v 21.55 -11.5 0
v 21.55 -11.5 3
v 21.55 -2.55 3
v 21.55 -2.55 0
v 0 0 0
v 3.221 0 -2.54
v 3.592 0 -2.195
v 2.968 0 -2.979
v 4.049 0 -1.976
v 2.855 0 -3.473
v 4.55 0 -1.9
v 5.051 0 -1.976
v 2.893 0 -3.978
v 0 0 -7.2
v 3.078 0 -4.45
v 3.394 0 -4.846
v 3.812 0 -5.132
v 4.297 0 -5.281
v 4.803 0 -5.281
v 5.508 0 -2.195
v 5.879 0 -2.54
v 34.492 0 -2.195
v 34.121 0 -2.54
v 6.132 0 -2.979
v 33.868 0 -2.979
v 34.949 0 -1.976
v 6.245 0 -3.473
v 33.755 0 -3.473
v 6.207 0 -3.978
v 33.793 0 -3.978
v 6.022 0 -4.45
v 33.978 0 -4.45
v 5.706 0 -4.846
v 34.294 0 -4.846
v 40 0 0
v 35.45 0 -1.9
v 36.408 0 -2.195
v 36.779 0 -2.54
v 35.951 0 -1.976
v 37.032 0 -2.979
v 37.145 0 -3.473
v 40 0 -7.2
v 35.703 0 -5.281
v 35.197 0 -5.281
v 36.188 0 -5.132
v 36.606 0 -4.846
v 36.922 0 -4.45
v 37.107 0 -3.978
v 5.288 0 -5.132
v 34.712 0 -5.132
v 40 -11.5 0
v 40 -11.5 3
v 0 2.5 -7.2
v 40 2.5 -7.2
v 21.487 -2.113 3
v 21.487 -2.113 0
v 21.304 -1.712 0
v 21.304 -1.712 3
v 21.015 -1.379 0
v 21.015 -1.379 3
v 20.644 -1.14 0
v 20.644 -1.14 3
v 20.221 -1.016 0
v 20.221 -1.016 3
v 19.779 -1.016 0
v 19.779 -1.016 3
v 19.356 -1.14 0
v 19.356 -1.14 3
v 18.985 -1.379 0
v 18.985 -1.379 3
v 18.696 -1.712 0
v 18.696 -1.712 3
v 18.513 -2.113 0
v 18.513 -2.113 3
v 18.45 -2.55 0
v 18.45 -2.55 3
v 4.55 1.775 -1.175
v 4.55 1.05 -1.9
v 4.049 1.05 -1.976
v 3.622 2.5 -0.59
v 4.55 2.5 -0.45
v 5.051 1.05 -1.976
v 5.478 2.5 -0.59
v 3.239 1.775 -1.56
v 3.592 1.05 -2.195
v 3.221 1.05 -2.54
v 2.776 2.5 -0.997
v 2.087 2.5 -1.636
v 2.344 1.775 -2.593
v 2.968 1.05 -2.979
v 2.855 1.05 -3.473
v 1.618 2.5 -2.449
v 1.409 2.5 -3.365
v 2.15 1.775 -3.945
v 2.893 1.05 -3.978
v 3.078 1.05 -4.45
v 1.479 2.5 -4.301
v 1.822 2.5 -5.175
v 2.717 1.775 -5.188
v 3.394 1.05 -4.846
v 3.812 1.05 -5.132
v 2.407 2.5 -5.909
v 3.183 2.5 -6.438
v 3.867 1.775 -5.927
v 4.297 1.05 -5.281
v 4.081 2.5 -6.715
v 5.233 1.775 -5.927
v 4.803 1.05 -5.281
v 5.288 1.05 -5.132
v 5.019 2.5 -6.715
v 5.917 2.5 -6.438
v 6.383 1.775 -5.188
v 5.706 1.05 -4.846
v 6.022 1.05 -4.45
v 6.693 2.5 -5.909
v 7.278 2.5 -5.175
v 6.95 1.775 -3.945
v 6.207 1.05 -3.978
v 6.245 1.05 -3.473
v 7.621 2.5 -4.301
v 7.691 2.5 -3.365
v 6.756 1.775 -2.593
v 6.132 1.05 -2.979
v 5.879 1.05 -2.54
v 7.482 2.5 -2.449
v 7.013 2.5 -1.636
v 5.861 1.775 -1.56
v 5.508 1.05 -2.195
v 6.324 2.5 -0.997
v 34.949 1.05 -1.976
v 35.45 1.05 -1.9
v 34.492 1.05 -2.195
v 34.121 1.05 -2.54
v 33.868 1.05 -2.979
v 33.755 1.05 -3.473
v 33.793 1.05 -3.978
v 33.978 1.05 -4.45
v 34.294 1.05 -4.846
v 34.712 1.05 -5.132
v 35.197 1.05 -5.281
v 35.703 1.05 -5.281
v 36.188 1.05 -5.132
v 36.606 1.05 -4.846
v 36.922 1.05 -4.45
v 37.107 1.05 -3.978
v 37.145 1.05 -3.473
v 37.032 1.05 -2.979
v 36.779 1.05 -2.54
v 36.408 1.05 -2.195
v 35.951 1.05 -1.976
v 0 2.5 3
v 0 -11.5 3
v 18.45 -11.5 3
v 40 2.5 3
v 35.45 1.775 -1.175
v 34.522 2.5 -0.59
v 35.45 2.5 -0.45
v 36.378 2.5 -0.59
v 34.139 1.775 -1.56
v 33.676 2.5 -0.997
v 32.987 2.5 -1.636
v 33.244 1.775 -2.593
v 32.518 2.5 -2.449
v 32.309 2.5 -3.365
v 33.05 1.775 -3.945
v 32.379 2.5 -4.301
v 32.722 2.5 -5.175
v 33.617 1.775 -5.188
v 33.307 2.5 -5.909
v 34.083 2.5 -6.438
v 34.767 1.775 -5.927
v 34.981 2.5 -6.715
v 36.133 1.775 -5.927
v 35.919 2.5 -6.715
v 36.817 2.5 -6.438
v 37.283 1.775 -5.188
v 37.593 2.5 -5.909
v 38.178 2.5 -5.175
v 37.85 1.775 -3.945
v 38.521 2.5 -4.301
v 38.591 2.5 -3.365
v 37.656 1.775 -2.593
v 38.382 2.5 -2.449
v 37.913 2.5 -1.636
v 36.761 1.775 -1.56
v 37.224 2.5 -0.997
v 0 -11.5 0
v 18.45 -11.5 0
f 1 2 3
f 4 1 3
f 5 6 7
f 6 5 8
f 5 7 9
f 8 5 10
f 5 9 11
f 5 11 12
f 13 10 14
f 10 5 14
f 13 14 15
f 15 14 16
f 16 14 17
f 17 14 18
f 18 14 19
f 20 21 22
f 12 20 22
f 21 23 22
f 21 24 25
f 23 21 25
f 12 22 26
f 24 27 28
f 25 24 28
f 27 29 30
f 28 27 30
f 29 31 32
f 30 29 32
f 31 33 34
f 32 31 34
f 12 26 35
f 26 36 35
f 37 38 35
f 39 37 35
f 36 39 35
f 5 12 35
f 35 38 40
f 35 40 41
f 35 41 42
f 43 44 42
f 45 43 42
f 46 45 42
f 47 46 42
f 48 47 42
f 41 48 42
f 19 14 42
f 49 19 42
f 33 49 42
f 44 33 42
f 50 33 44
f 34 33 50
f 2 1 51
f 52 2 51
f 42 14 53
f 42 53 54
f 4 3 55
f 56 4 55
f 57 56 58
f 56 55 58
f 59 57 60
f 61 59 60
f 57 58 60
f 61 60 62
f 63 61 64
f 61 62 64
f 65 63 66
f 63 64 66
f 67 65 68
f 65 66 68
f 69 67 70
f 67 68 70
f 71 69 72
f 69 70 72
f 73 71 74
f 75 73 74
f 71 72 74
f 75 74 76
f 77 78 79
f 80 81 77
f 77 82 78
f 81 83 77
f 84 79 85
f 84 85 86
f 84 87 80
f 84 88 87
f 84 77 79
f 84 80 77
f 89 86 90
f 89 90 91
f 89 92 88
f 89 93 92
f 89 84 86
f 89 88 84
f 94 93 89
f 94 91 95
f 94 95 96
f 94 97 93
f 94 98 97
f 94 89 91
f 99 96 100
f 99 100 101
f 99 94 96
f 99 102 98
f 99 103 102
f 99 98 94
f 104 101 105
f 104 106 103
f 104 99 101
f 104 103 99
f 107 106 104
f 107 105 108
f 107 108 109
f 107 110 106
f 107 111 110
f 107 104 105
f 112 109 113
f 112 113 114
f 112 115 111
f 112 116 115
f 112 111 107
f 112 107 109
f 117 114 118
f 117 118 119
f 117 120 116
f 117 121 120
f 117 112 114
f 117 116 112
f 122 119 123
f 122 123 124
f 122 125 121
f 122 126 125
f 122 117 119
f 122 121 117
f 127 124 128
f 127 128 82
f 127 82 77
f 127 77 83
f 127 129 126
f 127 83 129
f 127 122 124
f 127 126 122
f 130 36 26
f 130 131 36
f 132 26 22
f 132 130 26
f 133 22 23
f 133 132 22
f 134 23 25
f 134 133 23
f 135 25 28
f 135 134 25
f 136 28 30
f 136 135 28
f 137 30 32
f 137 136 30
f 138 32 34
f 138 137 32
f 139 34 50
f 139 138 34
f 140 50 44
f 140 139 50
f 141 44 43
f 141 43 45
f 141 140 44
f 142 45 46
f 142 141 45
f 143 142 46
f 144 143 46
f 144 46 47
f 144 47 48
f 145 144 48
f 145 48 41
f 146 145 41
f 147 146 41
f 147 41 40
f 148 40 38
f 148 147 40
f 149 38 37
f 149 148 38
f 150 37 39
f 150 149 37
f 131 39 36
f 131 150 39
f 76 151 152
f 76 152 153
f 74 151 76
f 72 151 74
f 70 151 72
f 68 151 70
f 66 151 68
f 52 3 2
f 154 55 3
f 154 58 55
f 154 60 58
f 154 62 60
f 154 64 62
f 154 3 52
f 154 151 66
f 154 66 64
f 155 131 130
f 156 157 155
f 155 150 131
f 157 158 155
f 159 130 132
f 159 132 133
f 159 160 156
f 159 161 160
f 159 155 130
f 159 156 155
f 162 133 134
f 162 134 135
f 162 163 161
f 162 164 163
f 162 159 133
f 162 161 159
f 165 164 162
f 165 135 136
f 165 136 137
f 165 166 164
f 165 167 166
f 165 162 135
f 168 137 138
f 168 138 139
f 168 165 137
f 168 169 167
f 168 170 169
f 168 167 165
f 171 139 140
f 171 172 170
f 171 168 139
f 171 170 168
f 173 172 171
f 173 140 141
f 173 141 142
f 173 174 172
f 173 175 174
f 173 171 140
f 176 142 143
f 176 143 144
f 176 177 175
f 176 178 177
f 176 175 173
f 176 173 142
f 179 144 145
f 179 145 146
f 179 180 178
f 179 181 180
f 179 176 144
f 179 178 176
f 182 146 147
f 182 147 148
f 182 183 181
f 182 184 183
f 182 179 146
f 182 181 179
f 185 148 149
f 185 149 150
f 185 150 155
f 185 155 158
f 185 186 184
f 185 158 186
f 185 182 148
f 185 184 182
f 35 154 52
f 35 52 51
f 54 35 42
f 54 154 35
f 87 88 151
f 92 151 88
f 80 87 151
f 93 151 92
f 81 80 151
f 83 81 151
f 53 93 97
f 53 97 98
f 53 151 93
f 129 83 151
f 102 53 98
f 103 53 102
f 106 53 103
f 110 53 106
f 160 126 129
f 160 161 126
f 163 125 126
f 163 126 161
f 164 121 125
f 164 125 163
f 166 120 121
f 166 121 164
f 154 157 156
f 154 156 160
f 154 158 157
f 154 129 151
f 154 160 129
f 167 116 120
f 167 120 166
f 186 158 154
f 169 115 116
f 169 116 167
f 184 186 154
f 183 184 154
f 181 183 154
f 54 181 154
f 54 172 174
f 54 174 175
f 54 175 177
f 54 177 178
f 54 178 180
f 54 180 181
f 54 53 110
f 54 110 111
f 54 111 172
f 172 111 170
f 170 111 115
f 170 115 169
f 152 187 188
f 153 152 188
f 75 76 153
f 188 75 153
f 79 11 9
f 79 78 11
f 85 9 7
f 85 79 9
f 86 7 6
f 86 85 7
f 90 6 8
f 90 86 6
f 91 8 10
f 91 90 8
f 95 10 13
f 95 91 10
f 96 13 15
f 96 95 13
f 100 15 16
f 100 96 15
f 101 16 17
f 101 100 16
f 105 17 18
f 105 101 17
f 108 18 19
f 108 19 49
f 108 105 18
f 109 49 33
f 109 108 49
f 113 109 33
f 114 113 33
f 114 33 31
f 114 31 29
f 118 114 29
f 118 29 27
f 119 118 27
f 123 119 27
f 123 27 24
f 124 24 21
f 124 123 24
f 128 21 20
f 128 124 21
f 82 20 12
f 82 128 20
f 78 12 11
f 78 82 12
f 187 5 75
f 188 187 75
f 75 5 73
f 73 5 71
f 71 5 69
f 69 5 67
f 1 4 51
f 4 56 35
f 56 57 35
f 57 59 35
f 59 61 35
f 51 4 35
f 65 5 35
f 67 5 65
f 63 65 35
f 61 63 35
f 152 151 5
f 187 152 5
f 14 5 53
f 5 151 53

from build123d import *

# Parameters (mm, degrees)
SKETCH1_W                                      = 40
SKETCH1_H                                      = 7.2
BOSS_EXTRUDE1_DEPTH                            = 2.5
CSK_FOR_M3_FLAT_HEAD_MACHINE_SCREW1_AT_2_COUNT = 2
CSK_FOR_M3_FLAT_HEAD_MACHINE_SCREW1_AT_2_PITCH = 30.9
SKETCH4_W                                      = 40
SKETCH4_H                                      = 3
BOSS_EXTRUDE2_DEPTH                            = 14
CUT_EXTRUDE1_DEPTH                             = 43.851954448


with BuildPart() as part:
    # Sketch1 → Boss-Extrude1 (new body)
    with BuildSketch(Plane(origin=(0, 0, 0), x_dir=(1, 0, 0), z_dir=(0, 1, 0))):
        with Locations((20, 3.6)):
            Rectangle(SKETCH1_W, SKETCH1_H)
    extrude(amount=BOSS_EXTRUDE1_DEPTH)

    # Sketch3 → CSK for M3 Flat Head Machine Screw1 (revolve, cut)
    with BuildSketch(Plane(origin=(35.45, 2.5, -3.6), x_dir=(0, 0, 1), z_dir=(1, 0, 0))):
        Polygon((0, 0), (0, 2.5), (1.7, 2.5), (1.7, 1.45), (3.15, 0), align=None)
    csk_for_m3_flat_head_machine_screw1 = revolve(axis=Axis((35.45, 8.85, -3.6), (0, -1, 0)), mode=Mode.SUBTRACT)

    # CSK for M3 Flat Head Machine Screw1 at 2: CSK for M3 Flat Head Machine Screw1 ×2
    with Locations(*[(-i * CSK_FOR_M3_FLAT_HEAD_MACHINE_SCREW1_AT_2_PITCH, 0, 0) for i in range(1, CSK_FOR_M3_FLAT_HEAD_MACHINE_SCREW1_AT_2_COUNT)]):
        add(csk_for_m3_flat_head_machine_screw1, mode=Mode.SUBTRACT)

    # Sketch4 → Boss-Extrude2 (add)
    with BuildSketch(Plane(origin=(0, 2.5, 0), x_dir=(1, 0, 0), z_dir=(0, 1, 0))):
        with Locations((20, -1.5)):
            Rectangle(SKETCH4_W, SKETCH4_H)
    extrude(amount=-BOSS_EXTRUDE2_DEPTH)

    # Sketch5 → Cut-Extrude1 (cut, through all)
    with BuildSketch(Plane.XY.offset(3)):
        with BuildLine():
            Line((18.45, -2.55), (18.45, -11.5))
            Line((18.45, -11.5), (21.55, -11.5))
            Line((21.55, -11.5), (21.55, -2.55))
            ThreePointArc((21.55, -2.55), (20, -1), (18.45, -2.55))
        make_face()
        with BuildLine():
            Line((21.55, -11.5), (18.45, -11.5))
            ThreePointArc((18.45, -11.5), (20, -13.05), (21.55, -11.5))
        make_face()
    extrude(amount=-CUT_EXTRUDE1_DEPTH, mode=Mode.SUBTRACT)


solid = part.part
